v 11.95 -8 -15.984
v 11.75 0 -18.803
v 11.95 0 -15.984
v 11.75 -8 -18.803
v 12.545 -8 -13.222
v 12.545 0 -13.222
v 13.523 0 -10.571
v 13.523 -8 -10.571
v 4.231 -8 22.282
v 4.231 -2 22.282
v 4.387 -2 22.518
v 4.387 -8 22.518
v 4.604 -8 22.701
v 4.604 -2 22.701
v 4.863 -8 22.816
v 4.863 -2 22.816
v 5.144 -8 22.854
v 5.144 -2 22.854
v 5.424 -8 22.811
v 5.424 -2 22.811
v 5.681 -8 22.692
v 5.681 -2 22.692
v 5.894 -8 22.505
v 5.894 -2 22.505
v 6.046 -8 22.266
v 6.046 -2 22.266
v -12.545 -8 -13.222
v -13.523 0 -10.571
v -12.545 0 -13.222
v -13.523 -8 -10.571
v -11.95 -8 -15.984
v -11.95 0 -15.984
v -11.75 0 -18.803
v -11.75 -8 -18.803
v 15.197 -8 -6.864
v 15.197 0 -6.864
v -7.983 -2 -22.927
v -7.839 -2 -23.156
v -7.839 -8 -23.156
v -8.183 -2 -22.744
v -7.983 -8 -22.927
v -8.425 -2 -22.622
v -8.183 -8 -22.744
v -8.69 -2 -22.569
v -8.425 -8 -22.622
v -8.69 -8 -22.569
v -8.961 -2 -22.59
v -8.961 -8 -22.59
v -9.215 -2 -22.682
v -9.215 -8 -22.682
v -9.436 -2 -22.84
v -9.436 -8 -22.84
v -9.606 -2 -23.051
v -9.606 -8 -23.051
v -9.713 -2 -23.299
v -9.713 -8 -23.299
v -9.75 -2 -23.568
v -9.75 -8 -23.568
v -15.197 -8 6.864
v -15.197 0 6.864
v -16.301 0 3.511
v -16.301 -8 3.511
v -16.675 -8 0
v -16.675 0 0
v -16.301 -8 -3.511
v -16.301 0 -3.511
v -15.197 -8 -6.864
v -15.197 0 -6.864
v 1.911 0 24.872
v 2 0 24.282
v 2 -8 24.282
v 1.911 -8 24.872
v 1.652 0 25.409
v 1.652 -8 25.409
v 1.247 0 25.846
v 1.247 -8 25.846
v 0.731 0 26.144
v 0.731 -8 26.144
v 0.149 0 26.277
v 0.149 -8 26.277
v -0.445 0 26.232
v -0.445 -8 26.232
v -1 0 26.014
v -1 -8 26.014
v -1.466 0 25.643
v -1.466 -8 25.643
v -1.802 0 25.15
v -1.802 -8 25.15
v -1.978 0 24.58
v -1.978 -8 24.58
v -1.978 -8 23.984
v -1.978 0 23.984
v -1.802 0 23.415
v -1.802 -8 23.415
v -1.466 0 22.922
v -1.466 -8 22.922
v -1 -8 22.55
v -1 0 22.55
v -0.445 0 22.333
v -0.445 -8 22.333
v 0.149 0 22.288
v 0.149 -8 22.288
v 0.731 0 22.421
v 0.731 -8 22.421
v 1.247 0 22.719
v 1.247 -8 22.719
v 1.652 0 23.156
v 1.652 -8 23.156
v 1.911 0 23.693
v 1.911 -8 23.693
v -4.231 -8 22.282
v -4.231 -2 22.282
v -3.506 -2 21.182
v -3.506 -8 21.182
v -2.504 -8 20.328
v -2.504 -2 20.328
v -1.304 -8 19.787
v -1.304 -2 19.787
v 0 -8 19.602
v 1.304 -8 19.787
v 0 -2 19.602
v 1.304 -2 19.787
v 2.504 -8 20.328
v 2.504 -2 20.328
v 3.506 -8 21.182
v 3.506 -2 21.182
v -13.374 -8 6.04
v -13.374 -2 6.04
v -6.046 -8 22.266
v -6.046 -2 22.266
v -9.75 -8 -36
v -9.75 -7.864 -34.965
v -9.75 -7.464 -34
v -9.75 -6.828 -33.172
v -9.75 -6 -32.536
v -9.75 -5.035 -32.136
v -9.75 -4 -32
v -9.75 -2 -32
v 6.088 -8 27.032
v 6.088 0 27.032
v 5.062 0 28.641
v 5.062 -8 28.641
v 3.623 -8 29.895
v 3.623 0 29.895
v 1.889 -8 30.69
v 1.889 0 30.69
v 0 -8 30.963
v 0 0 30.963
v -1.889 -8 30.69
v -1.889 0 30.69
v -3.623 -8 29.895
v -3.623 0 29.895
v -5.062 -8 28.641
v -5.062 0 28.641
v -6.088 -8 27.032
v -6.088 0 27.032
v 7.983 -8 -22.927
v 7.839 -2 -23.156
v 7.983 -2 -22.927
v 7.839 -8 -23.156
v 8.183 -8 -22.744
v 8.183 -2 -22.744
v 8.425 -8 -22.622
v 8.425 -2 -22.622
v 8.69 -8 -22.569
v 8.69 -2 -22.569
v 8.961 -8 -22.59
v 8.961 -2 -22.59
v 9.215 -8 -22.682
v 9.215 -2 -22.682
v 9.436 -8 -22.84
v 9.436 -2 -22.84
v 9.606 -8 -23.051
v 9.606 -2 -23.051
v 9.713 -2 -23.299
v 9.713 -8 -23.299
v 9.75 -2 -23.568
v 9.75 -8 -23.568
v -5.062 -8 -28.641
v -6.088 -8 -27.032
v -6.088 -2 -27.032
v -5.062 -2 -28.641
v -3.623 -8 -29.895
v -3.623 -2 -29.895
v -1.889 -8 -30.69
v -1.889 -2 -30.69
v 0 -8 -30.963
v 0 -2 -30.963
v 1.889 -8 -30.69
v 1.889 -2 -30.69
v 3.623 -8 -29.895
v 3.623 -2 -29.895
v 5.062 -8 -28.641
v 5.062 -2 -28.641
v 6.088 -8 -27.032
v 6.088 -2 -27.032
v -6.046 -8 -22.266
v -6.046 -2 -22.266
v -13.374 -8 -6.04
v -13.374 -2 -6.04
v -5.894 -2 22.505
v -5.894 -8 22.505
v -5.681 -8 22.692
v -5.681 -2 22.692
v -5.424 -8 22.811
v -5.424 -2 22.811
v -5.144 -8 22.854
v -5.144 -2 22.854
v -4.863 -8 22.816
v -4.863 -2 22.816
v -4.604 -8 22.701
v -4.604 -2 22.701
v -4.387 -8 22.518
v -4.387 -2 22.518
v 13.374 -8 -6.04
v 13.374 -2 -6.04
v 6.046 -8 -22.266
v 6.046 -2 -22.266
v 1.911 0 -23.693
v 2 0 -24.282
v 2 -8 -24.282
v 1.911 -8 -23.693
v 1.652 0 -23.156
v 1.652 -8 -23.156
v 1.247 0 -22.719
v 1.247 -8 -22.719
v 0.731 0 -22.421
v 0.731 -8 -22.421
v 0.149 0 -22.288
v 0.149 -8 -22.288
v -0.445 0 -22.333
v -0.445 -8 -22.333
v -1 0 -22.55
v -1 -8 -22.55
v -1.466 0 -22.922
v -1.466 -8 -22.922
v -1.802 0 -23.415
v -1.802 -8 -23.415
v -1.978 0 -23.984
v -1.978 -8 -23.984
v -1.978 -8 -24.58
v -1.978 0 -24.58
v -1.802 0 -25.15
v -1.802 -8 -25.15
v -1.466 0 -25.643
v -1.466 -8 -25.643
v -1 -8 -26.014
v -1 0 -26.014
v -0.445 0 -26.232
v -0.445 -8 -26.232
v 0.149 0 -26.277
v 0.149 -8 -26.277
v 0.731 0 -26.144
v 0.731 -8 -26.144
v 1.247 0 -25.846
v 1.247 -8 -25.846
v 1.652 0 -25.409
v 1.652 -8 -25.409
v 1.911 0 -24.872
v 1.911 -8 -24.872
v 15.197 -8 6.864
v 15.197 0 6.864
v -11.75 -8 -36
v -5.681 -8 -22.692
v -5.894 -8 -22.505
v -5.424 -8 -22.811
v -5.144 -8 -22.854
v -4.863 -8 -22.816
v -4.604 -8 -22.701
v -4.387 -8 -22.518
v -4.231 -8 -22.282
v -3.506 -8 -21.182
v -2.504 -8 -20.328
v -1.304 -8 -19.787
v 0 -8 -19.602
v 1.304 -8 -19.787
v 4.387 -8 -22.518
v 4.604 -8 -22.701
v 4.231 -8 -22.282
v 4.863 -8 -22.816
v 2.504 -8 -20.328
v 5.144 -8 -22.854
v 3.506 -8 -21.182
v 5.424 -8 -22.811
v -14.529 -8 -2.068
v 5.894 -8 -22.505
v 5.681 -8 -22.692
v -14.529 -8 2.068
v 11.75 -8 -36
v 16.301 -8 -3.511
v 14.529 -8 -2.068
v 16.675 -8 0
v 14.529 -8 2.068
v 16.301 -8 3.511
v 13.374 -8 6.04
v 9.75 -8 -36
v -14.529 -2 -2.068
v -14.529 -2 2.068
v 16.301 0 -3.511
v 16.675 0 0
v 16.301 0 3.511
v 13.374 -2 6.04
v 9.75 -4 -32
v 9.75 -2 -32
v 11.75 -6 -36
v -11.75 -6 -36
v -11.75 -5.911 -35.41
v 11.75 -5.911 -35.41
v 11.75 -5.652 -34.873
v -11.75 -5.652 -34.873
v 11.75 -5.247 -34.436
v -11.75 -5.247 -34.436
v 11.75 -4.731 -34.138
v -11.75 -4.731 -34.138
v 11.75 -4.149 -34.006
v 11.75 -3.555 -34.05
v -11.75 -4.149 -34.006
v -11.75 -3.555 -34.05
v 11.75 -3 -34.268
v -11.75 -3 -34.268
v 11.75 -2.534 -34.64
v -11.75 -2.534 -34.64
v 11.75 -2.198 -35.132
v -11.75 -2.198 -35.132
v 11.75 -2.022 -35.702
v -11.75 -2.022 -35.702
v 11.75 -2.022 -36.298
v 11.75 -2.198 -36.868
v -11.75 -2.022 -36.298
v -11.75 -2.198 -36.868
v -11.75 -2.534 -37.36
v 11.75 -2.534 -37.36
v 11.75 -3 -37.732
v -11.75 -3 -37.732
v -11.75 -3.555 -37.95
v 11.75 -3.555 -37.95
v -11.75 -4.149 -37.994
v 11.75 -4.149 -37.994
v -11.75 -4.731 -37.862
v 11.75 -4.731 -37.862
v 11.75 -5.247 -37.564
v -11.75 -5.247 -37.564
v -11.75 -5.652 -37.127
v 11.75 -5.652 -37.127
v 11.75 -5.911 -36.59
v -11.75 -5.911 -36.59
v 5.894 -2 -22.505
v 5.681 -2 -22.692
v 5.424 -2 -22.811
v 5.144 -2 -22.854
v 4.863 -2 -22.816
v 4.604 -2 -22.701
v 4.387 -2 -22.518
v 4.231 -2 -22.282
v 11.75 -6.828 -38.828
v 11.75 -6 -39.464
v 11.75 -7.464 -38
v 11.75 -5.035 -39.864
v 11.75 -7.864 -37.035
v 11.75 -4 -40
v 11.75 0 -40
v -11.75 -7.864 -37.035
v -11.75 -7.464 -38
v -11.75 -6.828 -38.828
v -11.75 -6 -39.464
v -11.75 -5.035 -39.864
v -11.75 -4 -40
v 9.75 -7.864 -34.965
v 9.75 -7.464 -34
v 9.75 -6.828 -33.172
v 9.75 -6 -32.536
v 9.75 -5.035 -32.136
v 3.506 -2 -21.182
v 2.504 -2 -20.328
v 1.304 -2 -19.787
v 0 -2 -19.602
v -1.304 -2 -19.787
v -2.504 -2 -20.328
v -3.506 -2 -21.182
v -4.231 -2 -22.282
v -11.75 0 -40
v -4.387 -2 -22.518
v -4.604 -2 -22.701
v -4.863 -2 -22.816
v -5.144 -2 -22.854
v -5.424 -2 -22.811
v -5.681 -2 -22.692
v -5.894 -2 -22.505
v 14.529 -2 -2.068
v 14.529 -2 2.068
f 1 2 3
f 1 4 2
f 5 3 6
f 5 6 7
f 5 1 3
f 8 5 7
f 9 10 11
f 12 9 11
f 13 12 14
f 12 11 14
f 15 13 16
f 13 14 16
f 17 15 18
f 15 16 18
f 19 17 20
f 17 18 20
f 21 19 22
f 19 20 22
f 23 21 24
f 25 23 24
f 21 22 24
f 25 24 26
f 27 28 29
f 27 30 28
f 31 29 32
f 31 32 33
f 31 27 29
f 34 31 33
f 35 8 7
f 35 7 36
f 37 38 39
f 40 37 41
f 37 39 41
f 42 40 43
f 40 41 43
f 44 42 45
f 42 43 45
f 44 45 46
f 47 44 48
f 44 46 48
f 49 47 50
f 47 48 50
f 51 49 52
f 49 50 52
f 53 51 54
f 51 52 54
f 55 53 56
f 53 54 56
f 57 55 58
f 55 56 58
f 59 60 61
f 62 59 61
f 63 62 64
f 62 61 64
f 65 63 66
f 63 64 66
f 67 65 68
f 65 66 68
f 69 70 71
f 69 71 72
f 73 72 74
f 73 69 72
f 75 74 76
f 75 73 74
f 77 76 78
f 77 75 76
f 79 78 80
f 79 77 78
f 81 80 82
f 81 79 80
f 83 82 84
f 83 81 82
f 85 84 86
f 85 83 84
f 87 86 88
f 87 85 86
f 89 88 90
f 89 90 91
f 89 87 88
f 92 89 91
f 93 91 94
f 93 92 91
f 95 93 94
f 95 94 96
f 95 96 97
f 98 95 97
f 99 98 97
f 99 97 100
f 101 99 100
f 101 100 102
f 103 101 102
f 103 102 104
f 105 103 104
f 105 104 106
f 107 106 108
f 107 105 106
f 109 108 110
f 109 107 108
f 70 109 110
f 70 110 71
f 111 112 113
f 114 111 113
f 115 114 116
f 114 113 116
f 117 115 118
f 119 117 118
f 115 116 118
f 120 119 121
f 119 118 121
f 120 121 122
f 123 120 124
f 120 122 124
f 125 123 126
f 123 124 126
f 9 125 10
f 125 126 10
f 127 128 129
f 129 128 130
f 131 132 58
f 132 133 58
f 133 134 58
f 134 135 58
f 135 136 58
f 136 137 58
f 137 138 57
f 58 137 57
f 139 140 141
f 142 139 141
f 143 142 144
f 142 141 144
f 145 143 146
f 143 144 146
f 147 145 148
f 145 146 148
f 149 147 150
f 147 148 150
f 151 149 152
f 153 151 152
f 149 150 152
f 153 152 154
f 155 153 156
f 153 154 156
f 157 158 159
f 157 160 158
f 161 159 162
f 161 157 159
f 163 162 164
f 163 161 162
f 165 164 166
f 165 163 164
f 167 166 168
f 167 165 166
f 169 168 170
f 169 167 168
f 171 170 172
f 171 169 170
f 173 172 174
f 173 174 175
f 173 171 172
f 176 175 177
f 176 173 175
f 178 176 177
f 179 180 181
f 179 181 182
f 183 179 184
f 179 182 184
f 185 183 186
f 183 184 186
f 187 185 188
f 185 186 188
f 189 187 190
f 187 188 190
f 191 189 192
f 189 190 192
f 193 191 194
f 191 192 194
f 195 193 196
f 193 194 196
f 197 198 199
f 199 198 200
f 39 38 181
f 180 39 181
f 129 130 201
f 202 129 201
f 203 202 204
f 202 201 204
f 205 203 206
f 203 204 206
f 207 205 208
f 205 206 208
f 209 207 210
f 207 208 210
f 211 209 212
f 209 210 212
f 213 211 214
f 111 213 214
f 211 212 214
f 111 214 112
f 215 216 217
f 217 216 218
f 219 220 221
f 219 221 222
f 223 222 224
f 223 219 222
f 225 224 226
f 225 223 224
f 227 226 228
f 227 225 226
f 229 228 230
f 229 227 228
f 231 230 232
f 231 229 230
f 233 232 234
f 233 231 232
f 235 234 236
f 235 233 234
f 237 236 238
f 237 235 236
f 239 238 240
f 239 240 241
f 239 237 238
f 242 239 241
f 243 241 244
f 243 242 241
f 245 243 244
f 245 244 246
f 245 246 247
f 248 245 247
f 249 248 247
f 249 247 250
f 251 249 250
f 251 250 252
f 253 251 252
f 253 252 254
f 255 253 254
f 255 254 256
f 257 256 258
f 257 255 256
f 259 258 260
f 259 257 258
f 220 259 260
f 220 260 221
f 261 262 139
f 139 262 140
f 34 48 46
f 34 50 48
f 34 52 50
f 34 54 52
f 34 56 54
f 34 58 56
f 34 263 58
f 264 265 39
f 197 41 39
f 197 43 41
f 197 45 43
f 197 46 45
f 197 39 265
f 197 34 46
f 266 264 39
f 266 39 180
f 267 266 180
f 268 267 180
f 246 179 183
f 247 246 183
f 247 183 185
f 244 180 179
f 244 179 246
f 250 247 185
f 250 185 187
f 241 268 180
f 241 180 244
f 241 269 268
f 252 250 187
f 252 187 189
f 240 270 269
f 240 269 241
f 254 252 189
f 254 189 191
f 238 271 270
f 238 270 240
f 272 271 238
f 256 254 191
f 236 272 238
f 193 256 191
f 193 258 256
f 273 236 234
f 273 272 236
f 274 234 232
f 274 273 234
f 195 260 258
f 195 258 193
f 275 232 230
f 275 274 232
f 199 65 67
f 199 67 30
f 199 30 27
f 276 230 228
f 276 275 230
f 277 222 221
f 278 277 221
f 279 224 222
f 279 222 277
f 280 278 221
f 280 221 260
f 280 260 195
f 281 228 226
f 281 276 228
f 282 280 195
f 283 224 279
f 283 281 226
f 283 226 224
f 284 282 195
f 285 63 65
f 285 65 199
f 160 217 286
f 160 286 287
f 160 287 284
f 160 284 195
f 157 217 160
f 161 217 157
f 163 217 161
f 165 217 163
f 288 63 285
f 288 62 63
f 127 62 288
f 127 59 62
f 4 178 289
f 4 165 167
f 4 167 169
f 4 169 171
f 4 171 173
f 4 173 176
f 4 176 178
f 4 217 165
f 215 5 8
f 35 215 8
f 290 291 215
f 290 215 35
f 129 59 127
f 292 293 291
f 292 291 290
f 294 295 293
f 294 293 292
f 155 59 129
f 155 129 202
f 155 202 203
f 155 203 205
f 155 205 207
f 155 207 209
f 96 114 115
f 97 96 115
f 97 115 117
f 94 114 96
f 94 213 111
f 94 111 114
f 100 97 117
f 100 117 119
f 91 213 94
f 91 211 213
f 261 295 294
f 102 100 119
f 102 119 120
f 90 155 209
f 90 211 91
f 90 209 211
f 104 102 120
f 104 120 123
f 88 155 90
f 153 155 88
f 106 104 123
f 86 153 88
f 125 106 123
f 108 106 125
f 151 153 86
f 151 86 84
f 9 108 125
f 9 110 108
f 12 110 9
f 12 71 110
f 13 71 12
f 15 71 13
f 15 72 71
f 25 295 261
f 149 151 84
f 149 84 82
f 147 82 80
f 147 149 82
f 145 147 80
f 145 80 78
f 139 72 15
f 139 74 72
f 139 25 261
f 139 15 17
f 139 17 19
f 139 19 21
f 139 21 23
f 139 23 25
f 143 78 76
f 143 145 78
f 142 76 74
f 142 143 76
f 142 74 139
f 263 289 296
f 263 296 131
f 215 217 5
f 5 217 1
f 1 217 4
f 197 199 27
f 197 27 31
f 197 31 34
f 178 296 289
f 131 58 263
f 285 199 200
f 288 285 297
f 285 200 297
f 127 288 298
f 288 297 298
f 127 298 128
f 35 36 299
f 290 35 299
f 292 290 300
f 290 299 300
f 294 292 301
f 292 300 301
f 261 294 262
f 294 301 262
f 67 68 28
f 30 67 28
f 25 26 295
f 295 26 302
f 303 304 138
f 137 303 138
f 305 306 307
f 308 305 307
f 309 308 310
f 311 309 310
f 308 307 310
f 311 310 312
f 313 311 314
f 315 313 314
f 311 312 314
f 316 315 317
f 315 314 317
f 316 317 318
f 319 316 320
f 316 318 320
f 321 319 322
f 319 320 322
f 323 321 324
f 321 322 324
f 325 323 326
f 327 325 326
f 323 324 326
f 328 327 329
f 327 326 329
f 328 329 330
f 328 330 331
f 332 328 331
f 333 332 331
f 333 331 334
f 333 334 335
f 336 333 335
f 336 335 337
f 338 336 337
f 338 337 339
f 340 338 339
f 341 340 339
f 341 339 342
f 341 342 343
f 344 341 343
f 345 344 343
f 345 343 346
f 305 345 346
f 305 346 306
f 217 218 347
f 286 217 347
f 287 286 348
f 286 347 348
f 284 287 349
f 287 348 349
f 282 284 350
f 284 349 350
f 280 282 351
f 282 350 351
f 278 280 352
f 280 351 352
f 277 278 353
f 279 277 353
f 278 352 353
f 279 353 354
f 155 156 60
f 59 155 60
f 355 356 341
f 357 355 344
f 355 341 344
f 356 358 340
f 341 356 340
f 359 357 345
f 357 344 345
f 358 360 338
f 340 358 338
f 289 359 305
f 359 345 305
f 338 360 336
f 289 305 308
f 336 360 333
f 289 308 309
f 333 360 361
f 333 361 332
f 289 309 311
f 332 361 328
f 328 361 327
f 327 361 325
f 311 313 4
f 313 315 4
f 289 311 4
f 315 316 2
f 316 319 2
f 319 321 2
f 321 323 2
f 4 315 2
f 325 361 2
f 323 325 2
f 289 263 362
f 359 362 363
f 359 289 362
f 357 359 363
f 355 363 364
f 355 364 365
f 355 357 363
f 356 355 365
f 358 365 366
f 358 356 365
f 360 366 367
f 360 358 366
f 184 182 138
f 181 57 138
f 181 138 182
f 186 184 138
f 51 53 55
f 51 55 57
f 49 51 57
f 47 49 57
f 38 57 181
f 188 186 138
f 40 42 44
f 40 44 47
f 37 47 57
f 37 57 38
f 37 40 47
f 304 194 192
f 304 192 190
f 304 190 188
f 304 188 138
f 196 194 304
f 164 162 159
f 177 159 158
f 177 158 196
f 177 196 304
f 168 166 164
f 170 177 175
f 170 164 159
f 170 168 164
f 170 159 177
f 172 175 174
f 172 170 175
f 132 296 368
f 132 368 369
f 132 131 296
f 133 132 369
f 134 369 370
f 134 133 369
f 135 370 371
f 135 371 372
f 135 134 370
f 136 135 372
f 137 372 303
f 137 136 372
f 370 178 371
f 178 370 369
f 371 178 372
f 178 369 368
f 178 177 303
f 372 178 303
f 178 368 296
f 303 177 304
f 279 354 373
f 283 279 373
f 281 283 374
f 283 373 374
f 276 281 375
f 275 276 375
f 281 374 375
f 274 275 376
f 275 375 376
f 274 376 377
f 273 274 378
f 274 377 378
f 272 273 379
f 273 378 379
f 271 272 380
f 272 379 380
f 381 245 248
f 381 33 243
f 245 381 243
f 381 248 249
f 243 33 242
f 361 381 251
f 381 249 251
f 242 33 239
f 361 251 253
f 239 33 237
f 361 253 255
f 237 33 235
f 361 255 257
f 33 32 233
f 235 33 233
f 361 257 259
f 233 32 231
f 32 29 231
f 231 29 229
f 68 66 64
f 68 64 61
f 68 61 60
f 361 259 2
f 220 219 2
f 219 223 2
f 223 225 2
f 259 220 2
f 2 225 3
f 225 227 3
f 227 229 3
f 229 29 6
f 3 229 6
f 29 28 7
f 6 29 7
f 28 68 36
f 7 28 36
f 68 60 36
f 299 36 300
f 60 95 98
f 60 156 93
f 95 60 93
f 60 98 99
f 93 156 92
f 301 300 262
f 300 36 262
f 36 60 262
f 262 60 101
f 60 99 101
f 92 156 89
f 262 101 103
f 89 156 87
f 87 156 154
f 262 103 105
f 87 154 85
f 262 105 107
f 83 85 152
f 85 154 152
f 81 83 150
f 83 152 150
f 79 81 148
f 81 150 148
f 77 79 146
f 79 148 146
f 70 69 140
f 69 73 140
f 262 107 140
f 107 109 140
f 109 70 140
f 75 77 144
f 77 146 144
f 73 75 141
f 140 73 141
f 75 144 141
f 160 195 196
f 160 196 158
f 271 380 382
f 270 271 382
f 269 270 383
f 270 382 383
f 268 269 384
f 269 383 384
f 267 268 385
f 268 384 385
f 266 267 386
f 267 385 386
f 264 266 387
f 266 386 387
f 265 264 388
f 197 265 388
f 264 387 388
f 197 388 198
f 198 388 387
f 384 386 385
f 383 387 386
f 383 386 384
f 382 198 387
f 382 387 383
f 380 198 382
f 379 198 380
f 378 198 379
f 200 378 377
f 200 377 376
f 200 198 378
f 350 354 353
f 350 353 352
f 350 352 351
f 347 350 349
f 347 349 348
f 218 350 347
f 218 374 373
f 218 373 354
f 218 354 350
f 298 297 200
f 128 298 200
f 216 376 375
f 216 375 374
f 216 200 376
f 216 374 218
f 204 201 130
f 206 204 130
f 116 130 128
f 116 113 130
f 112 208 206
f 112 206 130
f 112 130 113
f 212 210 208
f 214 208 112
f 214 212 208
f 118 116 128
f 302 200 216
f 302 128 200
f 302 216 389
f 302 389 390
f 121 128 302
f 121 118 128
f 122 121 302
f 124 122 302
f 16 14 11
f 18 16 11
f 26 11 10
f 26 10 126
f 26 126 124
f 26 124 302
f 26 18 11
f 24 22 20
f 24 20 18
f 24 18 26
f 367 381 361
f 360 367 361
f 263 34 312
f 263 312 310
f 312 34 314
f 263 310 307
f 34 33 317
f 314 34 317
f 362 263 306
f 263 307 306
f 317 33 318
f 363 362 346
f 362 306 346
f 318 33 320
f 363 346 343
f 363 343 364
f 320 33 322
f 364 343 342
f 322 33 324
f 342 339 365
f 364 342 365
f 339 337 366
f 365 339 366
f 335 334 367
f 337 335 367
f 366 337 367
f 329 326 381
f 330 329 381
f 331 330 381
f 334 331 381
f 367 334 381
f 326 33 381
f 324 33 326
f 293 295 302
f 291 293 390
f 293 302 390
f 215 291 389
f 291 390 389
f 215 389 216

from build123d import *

# Parameters (mm, degrees)
F0_R     = 2
F1_DEPTH = 8
F2_DEPTH = 2
F3_R     = 20
F4_R     = 1
F6_D     = 4
F7_R     = 3.99999


# Not quite as in the source:
# - a fillet or chamfer is up to 0.001 mm smaller than in the source, because OpenCascade refuses the exact size
# - a feature names something its author has since deleted; it is built from what else it names


with BuildPart() as f1:
    # F0 (on Front) → F1 (new body)
    with BuildSketch(Plane.XZ):
        with BuildLine():
            Line((15.1970139668, 6.8636525628), (6.0880650012, 27.0320429916))
            ThreePointArc((6.0880650012, 27.0320429916), (0, 30.9626), (-6.0880650012, 27.0320429916))
            Line((-6.0880650012, 27.0320429916), (-15.1970139668, 6.8636525628))
            ThreePointArc((-15.1970139668, 6.8636525628), (-16.6751, 0), (-15.1970139668, -6.8636525628))
            Line((-15.1970139668, -6.8636525628), (-11.75, -14.4957870449))
            Line((-11.75, -14.4957870449), (-9.75, -18.9240455641))
            Line((-9.75, -18.9240455641), (-6.0880650012, -27.0320429916))
            ThreePointArc((-6.0880650012, -27.0320429916), (0, -30.9626), (6.0880650012, -27.0320429916))
            Line((6.0880650012, -27.0320429916), (9.75, -18.9240455641))
            Line((9.75, -18.9240455641), (11.75, -14.4957870449))
            Line((11.75, -14.4957870449), (15.1970139668, -6.8636525628))
            ThreePointArc((15.1970139668, -6.8636525628), (16.6751, 0), (15.1970139668, 6.8636525628))
        make_face()
        with Locations((0, -24.2824)):
            Circle(F0_R, mode=Mode.SUBTRACT)
        with BuildLine():
            Line((-13.3742945868, 6.0404308054), (-6.0462846285, 22.2655920687))
            ThreePointArc((-6.0462846285, 22.2655920687), (-5.1436901116, 22.8539427752), (-4.2309206889, 22.2815046593))
            ThreePointArc((-4.2309206889, 22.2815046593), (0, 19.6022), (4.2309206889, 22.2815046593))
            ThreePointArc((4.2309206889, 22.2815046593), (5.1436901116, 22.8539427752), (6.0462846285, 22.2655920687))
            Line((6.0462846285, 22.2655920687), (13.3742945868, 6.0404308054))
            ThreePointArc((13.3742945868, 6.0404308054), (14.6751, 0), (13.3742945868, -6.0404308054))
            Line((13.3742945868, -6.0404308054), (6.0462846285, -22.2655920687))
            ThreePointArc((6.0462846285, -22.2655920687), (5.1436901116, -22.8539427752), (4.2309206889, -22.2815046593))
            ThreePointArc((4.2309206889, -22.2815046593), (0, -19.6022), (-4.2309206889, -22.2815046593))
            ThreePointArc((-4.2309206889, -22.2815046593), (-5.1436901116, -22.8539427752), (-6.0462846285, -22.2655920687))
            Line((-6.0462846285, -22.2655920687), (-13.3742945868, -6.0404308054))
            ThreePointArc((-13.3742945868, -6.0404308054), (-14.6751, 0), (-13.3742945868, 6.0404308054))
        make_face(mode=Mode.SUBTRACT)
        with Locations((0, 24.2824)):
            Circle(F0_R, mode=Mode.SUBTRACT)
        Polygon((11.75, -40), (11.75, -14.4957870449), (9.75, -18.9240455641), (9.75, -32), (-9.75, -32), (-9.75, -18.9240455641), (-11.75, -14.4957870449), (-11.75, -40), align=None)
    extrude(amount=F1_DEPTH)

    # F0 (on Front) → F2 (join)
    with BuildSketch(Plane.XZ):
        with BuildLine():
            ThreePointArc((-4.2309206889, 22.2815046593), (-5.1436901116, 22.8539427752), (-6.0462846285, 22.2655920687))
            Line((-6.0462846285, 22.2655920687), (-13.3742945868, 6.0404308054))
            ThreePointArc((-13.3742945868, 6.0404308054), (-14.6751, 0), (-13.3742945868, -6.0404308054))
            Line((-13.3742945868, -6.0404308054), (-6.0462846285, -22.2655920687))
            ThreePointArc((-6.0462846285, -22.2655920687), (-5.1436901116, -22.8539427752), (-4.2309206889, -22.2815046593))
            ThreePointArc((-4.2309206889, -22.2815046593), (0, -19.6022), (4.2309206889, -22.2815046593))
            ThreePointArc((4.2309206889, -22.2815046593), (5.1436901116, -22.8539427752), (6.0462846285, -22.2655920687))
            Line((6.0462846285, -22.2655920687), (13.3742945868, -6.0404308054))
            ThreePointArc((13.3742945868, -6.0404308054), (14.6751, 0), (13.3742945868, 6.0404308054))
            Line((13.3742945868, 6.0404308054), (6.0462846285, 22.2655920687))
            ThreePointArc((6.0462846285, 22.2655920687), (5.1436901116, 22.8539427752), (4.2309206889, 22.2815046593))
            ThreePointArc((4.2309206889, 22.2815046593), (0, 19.6022), (-4.2309206889, 22.2815046593))
        make_face()
        with BuildLine():
            Line((9.75, -32), (9.75, -18.9240455641))
            Line((9.75, -18.9240455641), (6.0880650012, -27.0320429916))
            ThreePointArc((6.0880650012, -27.0320429916), (0, -30.9626), (-6.0880650012, -27.0320429916))
            Line((-6.0880650012, -27.0320429916), (-9.75, -18.9240455641))
            Line((-9.75, -18.9240455641), (-9.75, -32))
            Line((-9.75, -32), (9.75, -32))
        make_face()
    extrude(amount=F2_DEPTH)

    # F3
    f3_edges = [f1.edges().sort_by_distance(p)[0] for p in [
        (11.75, -4, -14.495787),
        (-11.75, -4, -14.495787),
    ]]
    fillet(f3_edges, radius=F3_R)

    # F4
    f4_edges = [f1.edges().sort_by_distance(p)[0] for p in [
        (9.75, -5, -18.924046),
        (-9.75, -5, -18.924046),
    ]]
    fillet(f4_edges, radius=F4_R)

    # F6 (through all)
    with Locations(Plane.YZ.offset(11.75)):
        with Locations((-4, -36)):
            Hole(F6_D / 2)

    # F7 (radius 4 in the source; OpenCascade refuses exactly that, so slightly less here)
    f7_edges = [f1.edges().sort_by_distance(p)[0] for p in [
        (0, -8, -40),
        (0, -8, -32),
    ]]
    fillet(f7_edges, radius=F7_R)


solid = f1.part
